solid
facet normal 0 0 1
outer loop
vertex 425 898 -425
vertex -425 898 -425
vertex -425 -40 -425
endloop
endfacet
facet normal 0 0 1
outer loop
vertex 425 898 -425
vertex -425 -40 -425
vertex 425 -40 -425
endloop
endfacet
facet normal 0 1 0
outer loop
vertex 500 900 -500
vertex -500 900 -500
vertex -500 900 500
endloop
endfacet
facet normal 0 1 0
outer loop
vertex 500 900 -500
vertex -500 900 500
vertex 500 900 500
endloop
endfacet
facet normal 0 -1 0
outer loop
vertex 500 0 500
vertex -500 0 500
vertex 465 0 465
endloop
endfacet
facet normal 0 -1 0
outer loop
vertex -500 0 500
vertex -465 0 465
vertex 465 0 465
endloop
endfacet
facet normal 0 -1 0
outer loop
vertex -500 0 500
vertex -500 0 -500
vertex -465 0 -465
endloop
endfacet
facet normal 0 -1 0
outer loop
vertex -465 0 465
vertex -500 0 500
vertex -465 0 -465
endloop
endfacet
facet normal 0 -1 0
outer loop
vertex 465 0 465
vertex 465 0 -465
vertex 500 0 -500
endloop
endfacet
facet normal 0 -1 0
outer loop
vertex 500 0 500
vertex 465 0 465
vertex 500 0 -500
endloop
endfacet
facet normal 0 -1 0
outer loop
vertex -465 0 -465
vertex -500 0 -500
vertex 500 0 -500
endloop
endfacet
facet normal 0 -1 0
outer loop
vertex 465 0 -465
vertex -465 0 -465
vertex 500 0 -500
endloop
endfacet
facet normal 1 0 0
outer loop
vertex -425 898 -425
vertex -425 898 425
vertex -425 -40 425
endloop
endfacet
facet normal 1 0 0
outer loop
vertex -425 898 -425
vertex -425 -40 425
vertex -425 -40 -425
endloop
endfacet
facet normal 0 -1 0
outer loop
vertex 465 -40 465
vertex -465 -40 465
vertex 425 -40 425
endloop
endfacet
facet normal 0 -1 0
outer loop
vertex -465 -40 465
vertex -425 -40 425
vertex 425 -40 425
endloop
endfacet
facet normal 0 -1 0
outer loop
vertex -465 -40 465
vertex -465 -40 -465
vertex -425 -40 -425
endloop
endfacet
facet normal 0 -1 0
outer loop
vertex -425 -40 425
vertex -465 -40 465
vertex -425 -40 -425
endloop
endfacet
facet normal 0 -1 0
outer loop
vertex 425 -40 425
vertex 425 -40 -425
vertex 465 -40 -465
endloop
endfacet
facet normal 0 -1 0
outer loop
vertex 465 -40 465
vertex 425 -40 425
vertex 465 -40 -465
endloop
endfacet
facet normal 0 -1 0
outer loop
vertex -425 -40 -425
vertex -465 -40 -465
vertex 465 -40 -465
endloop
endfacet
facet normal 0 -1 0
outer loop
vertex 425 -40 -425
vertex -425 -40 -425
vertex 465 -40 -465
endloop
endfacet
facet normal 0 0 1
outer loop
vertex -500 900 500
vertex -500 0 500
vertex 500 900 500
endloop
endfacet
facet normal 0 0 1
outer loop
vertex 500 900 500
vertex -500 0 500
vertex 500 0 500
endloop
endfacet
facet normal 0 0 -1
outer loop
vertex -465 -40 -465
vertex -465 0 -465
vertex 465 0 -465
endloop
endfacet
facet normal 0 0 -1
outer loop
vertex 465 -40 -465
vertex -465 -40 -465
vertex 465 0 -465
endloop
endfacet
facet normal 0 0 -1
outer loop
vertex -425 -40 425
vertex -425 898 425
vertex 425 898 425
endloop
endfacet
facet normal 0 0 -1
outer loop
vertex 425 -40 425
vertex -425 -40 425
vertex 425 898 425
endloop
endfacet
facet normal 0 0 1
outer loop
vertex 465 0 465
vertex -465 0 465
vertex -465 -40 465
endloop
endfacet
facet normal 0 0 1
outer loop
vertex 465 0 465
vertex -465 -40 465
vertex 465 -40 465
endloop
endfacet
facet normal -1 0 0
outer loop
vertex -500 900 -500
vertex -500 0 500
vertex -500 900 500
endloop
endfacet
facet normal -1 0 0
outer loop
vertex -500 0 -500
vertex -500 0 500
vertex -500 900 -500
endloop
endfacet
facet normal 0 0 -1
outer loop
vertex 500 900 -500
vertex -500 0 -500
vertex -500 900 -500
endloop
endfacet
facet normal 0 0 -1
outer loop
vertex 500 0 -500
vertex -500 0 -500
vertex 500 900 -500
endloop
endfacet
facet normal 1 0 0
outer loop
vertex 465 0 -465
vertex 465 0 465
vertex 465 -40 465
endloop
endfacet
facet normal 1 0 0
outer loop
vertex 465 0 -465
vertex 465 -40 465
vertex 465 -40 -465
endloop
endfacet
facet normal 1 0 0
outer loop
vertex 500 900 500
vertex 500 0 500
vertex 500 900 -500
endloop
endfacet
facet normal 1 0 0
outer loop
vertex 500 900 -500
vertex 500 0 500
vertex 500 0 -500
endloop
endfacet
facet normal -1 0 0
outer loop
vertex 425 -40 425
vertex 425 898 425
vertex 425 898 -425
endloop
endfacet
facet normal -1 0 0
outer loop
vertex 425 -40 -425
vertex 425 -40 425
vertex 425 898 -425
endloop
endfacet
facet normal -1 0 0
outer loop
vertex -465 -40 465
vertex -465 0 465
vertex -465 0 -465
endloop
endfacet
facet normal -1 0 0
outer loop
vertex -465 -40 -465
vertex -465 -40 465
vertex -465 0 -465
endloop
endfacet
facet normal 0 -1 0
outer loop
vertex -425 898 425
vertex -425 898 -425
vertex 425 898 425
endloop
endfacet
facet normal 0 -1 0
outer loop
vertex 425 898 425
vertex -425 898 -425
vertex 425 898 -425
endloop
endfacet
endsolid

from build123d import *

# Parameters (mm, degrees)
SKETCH1_W           = 1000
SKETCH1_H           = 1000
SKETCH1_W_2         = 930
SKETCH1_H_2         = 930
SKETCH1_W_3         = 850
SKETCH1_H_3         = 850
BOSS_EXTRUDE2_DEPTH = 900
SKETCH1_4_W         = 930
SKETCH1_4_H         = 930
SKETCH1_4_W_2       = 850
SKETCH1_4_H_2       = 850
BOSS_EXTRUDE3_DEPTH = 40
BOSS_EXTRUDE4_START = 900
SKETCH1_5_W         = 850
SKETCH1_5_H         = 850
BOSS_EXTRUDE4_DEPTH = 2


with BuildPart() as part:
    # Sketch1 → Boss-Extrude2 (new body)
    # profile 1 of 2: a face of its own
    with BuildSketch(Plane(origin=(0, 0, 0), x_dir=(1, 0, 0), z_dir=(0, 1, 0))):
        Rectangle(SKETCH1_W, SKETCH1_H)
        Rectangle(SKETCH1_W_2, SKETCH1_H_2, mode=Mode.SUBTRACT)
    # profile 2 of 2: a face of its own
    with BuildSketch(Plane(origin=(0, 0, 0), x_dir=(1, 0, 0), z_dir=(0, 1, 0))):
        Rectangle(SKETCH1_W_2, SKETCH1_H_2)
        Rectangle(SKETCH1_W_3, SKETCH1_H_3, mode=Mode.SUBTRACT)
    extrude(amount=BOSS_EXTRUDE2_DEPTH)

    # Sketch1<4> → Boss-Extrude3 (add)
    with BuildSketch(Plane(origin=(0, 0, 0), x_dir=(1, 0, 0), z_dir=(0, 1, 0))):
        Rectangle(SKETCH1_4_W, SKETCH1_4_H)
        Rectangle(SKETCH1_4_W_2, SKETCH1_4_H_2, mode=Mode.SUBTRACT)
    extrude(amount=-BOSS_EXTRUDE3_DEPTH)

    # Sketch1<5> → Boss-Extrude4 (add)
    with BuildSketch(Plane(origin=(0, 0, 0), x_dir=(1, 0, 0), z_dir=(0, 1, 0)).offset(BOSS_EXTRUDE4_START)):
        Rectangle(SKETCH1_5_W, SKETCH1_5_H)
    extrude(amount=-BOSS_EXTRUDE4_DEPTH)


solid = part.part
